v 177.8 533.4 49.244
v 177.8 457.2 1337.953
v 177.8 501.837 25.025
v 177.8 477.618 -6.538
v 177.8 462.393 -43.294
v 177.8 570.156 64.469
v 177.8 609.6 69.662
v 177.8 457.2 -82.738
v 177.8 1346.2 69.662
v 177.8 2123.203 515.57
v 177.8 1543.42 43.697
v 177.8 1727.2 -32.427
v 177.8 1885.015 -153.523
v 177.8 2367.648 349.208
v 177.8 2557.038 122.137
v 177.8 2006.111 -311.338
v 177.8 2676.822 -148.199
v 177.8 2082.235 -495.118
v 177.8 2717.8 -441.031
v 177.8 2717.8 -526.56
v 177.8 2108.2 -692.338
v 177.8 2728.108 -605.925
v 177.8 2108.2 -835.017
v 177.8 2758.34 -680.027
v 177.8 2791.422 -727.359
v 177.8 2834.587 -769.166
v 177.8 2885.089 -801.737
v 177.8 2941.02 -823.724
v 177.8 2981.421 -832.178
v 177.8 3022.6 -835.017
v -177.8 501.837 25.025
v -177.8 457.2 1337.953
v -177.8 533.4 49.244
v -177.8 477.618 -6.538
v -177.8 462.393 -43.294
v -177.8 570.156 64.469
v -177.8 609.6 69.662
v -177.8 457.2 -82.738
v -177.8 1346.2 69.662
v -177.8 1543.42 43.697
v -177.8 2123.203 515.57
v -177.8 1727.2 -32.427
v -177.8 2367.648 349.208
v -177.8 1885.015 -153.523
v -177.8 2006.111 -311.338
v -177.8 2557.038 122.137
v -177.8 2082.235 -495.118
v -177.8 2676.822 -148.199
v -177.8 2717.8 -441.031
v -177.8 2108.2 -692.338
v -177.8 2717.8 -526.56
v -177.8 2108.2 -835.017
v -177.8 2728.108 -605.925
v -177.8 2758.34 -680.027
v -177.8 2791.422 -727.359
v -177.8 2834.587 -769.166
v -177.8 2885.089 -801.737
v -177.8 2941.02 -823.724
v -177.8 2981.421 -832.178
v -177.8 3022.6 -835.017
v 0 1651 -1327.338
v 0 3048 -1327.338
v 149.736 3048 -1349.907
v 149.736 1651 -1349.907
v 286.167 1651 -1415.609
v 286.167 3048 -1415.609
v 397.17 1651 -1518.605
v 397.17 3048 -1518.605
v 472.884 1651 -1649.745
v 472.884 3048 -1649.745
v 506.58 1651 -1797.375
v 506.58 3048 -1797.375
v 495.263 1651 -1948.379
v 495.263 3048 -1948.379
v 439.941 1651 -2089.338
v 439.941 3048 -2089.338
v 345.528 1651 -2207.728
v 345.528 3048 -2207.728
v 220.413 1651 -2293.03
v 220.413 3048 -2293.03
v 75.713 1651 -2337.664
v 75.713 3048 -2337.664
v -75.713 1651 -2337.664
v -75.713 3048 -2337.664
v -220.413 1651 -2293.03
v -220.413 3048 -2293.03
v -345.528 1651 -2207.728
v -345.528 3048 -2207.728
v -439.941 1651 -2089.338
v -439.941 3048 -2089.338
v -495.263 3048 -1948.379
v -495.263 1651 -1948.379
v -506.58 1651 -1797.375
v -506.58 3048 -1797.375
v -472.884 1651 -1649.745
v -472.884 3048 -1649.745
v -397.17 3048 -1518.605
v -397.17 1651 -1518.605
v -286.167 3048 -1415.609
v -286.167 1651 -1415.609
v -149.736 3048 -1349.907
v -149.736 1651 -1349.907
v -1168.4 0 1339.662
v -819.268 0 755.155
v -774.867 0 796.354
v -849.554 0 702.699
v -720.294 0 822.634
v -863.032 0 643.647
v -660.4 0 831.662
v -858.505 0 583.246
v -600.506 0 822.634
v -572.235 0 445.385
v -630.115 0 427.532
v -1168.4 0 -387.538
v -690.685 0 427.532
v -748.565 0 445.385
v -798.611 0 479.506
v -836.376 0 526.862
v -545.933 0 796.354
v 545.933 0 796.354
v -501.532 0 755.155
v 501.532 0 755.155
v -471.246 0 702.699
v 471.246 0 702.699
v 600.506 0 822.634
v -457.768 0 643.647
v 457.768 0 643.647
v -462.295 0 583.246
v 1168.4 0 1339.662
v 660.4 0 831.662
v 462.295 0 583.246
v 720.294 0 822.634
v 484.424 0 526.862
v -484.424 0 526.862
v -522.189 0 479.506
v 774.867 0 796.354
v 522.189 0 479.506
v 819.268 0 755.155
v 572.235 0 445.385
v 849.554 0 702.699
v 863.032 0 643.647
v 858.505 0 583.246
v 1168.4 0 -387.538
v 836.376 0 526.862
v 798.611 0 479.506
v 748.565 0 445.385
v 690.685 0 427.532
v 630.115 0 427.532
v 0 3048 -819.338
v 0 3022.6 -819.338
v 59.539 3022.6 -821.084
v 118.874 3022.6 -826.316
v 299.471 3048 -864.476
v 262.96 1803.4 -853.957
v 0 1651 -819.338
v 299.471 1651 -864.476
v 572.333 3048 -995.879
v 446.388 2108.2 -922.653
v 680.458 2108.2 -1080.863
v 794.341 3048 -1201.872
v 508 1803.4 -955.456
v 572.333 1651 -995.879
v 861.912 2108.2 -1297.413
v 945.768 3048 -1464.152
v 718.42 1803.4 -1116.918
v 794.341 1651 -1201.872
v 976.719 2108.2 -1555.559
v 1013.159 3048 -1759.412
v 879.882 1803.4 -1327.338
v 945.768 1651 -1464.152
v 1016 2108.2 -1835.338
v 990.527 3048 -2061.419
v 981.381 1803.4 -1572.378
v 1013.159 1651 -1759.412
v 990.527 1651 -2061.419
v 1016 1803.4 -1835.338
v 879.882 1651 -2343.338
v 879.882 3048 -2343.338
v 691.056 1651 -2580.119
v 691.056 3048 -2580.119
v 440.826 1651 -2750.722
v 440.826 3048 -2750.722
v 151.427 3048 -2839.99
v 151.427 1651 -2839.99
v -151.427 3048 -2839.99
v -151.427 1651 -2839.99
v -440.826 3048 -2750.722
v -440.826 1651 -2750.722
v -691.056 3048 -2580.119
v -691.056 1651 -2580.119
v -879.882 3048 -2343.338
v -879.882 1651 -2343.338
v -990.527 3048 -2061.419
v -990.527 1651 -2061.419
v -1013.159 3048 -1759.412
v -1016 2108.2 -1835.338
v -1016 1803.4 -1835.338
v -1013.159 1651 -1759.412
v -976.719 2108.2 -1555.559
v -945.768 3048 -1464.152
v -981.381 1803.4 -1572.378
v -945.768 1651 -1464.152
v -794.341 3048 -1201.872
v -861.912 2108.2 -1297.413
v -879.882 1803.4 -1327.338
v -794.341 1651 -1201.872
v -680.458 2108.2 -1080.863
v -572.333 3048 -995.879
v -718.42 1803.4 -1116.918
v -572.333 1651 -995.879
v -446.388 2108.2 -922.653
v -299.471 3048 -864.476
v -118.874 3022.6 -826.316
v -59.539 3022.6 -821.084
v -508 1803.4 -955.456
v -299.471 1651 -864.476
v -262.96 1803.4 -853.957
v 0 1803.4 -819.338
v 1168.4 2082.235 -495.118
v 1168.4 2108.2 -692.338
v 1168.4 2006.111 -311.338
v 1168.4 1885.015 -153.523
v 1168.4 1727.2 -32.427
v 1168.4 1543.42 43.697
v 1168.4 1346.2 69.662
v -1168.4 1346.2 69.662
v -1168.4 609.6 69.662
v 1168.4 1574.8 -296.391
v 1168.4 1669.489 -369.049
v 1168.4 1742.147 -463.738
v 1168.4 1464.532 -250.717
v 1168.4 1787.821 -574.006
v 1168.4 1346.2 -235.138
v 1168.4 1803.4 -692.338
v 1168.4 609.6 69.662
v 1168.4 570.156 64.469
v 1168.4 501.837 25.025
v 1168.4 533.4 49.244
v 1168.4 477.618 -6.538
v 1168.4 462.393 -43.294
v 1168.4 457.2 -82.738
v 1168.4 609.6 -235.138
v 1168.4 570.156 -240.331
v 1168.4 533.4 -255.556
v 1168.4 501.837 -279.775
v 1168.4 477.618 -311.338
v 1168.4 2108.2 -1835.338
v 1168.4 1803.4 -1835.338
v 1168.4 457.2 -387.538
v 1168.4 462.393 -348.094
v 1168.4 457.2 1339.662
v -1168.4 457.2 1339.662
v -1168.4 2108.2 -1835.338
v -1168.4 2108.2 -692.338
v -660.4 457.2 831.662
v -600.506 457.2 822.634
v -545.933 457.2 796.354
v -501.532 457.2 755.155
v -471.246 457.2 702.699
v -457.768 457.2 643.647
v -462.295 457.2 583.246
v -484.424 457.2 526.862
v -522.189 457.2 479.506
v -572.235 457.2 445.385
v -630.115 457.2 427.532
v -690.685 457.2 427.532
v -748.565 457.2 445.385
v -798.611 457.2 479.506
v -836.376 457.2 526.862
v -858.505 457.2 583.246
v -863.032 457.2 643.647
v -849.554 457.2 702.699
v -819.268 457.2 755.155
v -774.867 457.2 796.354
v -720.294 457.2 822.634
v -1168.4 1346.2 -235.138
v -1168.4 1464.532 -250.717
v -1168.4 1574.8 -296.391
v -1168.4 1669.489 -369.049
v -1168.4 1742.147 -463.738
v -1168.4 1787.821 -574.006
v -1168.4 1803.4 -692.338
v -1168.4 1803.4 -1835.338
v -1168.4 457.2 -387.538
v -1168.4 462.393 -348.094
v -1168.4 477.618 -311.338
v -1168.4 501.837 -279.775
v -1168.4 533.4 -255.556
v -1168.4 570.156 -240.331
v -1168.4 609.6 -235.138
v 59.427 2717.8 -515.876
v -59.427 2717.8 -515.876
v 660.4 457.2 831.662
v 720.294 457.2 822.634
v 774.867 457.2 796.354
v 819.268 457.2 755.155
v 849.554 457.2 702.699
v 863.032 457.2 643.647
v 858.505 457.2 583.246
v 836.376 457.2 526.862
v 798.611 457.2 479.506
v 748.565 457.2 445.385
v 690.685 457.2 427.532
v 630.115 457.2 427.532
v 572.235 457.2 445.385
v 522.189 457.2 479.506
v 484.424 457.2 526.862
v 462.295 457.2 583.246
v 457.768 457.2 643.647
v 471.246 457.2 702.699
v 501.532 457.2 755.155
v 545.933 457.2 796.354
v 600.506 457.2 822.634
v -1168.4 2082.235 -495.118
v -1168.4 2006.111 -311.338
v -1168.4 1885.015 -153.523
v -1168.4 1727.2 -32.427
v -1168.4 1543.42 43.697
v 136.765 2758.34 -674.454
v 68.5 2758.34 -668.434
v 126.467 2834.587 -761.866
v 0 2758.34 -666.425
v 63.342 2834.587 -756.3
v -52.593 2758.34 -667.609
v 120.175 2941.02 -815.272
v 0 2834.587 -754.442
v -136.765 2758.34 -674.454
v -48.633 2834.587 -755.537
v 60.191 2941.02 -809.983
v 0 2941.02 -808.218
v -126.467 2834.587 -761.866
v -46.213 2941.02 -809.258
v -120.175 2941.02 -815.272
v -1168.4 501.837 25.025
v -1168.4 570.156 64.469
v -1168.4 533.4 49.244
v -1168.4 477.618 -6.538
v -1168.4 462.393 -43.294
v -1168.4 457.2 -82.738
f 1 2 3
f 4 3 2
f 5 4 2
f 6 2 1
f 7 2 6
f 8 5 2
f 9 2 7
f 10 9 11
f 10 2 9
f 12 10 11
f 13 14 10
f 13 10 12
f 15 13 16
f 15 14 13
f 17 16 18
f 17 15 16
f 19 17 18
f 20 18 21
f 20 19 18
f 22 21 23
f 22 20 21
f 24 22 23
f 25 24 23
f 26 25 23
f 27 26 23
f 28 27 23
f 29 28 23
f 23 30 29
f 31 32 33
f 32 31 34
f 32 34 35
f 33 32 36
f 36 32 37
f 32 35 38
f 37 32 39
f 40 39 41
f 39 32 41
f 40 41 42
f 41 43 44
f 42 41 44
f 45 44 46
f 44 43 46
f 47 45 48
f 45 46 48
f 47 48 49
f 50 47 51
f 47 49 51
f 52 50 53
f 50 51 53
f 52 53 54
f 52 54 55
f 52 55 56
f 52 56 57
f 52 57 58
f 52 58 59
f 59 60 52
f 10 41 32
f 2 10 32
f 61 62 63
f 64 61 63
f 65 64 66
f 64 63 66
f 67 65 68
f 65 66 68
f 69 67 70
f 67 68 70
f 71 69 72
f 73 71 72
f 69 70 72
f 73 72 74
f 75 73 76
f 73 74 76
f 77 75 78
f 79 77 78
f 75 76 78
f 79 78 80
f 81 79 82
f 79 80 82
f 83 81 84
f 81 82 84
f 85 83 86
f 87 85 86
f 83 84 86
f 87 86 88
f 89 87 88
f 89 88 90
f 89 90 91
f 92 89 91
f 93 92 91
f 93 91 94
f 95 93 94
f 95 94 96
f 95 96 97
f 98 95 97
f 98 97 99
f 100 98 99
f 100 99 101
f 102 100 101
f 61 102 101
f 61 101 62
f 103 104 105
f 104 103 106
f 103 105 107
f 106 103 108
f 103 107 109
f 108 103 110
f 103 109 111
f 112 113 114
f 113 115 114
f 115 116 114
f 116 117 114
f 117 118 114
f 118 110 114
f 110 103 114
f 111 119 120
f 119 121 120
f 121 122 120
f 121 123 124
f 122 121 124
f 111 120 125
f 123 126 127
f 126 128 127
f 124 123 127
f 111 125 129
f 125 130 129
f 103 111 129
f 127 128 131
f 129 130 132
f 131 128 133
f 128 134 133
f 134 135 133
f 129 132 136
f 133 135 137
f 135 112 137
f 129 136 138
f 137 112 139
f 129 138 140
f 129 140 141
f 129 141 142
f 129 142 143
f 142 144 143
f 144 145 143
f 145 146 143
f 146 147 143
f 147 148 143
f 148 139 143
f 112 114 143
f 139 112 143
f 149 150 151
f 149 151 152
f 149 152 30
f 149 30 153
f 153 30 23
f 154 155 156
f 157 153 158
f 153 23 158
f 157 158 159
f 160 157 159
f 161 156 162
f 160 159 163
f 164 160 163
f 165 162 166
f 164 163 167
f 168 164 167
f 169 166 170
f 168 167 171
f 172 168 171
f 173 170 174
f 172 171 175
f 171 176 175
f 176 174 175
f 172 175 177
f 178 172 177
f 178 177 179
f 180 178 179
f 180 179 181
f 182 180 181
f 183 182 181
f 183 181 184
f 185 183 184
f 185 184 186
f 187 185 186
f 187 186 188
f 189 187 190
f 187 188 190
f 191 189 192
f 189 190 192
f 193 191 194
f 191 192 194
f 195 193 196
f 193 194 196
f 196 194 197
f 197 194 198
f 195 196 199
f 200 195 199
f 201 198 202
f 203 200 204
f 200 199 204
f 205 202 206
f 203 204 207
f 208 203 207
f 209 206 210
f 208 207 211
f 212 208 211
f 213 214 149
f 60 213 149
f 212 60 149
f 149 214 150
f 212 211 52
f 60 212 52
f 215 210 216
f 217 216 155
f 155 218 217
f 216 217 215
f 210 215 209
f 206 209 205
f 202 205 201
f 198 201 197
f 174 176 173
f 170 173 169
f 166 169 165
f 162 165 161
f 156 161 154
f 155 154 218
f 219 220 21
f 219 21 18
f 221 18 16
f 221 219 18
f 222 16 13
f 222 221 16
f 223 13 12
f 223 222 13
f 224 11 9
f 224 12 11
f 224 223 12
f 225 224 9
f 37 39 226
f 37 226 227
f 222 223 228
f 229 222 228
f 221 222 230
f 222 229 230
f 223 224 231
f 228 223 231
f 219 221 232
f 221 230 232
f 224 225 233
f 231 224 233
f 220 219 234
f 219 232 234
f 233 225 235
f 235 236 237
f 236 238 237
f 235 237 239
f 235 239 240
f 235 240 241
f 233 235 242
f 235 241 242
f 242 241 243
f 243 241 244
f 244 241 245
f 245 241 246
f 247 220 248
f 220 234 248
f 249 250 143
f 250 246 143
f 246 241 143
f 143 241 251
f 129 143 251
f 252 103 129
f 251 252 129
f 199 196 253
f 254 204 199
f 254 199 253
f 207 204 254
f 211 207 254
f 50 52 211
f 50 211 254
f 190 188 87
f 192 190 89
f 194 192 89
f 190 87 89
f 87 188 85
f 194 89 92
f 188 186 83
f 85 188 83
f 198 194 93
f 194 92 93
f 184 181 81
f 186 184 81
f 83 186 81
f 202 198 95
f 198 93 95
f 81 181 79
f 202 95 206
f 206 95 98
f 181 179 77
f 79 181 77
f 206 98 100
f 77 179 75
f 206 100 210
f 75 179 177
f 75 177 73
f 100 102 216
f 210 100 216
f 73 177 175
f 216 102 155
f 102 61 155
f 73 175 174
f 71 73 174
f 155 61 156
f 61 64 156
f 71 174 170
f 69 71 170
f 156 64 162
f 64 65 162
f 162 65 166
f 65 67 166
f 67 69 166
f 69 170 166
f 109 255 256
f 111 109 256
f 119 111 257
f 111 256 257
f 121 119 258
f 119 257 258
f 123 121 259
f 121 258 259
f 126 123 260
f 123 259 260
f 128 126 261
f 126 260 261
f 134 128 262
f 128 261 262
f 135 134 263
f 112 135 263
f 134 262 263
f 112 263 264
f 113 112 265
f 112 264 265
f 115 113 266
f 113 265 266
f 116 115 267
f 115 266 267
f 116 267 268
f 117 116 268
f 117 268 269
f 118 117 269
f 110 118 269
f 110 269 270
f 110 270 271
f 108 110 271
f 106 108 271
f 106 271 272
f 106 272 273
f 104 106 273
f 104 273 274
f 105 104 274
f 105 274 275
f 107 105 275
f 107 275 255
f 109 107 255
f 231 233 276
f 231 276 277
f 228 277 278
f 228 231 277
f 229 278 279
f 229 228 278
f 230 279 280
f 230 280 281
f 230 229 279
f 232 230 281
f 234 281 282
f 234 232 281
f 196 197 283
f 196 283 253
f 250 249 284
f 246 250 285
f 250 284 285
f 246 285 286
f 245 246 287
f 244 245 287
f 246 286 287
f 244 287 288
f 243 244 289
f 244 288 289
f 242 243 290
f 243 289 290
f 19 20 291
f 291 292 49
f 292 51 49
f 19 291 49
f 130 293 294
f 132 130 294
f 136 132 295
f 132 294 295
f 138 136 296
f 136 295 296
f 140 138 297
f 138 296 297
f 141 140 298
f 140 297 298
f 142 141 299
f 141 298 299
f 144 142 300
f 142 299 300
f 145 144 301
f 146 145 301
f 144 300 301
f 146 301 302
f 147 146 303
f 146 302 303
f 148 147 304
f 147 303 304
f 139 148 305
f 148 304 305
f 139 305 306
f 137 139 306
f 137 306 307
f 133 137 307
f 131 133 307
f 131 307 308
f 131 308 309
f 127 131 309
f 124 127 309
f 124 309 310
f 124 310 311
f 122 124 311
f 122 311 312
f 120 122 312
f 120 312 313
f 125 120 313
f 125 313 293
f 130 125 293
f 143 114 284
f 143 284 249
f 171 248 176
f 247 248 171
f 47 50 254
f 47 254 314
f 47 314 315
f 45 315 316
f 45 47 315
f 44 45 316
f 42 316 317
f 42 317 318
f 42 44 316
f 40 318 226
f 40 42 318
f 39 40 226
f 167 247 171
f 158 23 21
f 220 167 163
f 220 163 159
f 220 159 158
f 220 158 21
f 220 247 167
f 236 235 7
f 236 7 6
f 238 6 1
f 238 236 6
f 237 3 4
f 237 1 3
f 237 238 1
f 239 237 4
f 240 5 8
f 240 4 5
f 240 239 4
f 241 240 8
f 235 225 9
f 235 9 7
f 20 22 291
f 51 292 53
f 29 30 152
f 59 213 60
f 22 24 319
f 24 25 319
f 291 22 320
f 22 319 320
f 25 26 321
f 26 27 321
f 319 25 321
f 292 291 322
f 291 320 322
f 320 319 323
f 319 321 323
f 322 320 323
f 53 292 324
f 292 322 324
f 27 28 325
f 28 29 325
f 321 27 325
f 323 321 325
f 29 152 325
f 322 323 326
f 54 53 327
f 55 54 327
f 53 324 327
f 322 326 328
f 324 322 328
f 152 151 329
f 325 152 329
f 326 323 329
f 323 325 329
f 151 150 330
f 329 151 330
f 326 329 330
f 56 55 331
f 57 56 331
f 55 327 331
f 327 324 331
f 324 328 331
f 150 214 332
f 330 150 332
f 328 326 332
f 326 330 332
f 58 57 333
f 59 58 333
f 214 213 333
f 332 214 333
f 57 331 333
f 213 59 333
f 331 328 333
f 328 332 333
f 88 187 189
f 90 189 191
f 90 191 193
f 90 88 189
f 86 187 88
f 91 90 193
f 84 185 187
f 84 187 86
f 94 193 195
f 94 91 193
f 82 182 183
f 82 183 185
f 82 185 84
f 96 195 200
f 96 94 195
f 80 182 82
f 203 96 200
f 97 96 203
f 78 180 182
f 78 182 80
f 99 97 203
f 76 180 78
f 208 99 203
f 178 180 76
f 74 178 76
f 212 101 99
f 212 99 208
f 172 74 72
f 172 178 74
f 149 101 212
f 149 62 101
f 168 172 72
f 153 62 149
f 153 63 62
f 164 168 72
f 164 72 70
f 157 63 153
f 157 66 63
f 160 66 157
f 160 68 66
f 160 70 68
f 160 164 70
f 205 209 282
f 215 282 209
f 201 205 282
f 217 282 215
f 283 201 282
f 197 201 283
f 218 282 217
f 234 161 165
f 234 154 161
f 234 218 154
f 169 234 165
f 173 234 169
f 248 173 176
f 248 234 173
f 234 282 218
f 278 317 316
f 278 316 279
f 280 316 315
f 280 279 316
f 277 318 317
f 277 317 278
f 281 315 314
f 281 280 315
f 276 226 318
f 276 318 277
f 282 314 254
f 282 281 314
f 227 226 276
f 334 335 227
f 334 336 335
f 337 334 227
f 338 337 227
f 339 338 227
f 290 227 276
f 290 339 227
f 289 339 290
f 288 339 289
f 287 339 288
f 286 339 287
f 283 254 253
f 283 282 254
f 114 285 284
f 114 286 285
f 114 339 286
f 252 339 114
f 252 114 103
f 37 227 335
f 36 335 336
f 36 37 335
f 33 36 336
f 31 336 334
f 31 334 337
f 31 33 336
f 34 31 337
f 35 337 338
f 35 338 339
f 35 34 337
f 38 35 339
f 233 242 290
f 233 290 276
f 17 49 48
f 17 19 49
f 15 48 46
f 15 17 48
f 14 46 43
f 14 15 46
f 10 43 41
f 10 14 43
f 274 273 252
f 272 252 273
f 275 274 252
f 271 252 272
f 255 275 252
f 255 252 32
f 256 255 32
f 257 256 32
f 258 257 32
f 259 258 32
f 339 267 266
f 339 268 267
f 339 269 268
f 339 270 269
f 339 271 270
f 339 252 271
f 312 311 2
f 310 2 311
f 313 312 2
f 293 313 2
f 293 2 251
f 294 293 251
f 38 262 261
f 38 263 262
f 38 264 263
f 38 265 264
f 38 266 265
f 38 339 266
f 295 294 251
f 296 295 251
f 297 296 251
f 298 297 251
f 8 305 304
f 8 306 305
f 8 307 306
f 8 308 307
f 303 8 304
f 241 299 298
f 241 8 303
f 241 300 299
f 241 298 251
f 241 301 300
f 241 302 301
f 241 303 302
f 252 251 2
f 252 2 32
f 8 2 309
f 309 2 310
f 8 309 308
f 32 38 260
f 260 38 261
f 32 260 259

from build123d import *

# Parameters (mm, degrees)
SKETCH1_W                = 2336.8
SKETCH1_H                = 1727.2
BOSS_EXTRUDE1_DEPTH      = 457.2
SKETCH2_R                = 203.2
CUT_EXTRUDE1_DEPTH       = 1836.452141677
BOSS_EXTRUDE2_DEPTH      = 2336.8
FILLET2_R                = 152.4
BOSS_EXTRUDE3_DEPTH      = 939.8
BOSS_EXTRUDE3_DEPTH_BACK = 457.2
SKETCH5_R                = 1016
SKETCH6_R                = 508
CUT_EXTRUDE2_DEPTH       = 4335.234786449
RIB1_START               = -177.8
RIB1_DEPTH               = 355.6
FILLET3_R                = 1066.8
FILLET4_R                = 304.8


# Read off the part's stored shape, not the designer's step: Rib1
with BuildPart() as part:
    # Sketch1 → Boss-Extrude1 (new body)
    with BuildSketch(Plane(origin=(0, 0, 0), x_dir=(1, 0, 0), z_dir=(0, 1, 0))):
        with Locations((0, -476.061958998)):
            Rectangle(SKETCH1_W, SKETCH1_H)
    extrude(amount=BOSS_EXTRUDE1_DEPTH)

    # Sketch2 → Cut-Extrude1 (cut, through all)
    with BuildSketch(Plane(origin=(0, 457.2, 0), x_dir=(1, 0, 0), z_dir=(0, 1, 0))):
        with Locations(Location((-660.4, -628.461958998, 0), (0, 0, 270))):
            Circle(SKETCH2_R)
        with Locations(Location((660.4, -628.461958998, 0), (0, 0, 270))):
            Circle(SKETCH2_R)
    extrude(amount=-CUT_EXTRUDE1_DEPTH, mode=Mode.SUBTRACT)

    # Sketch4 → Boss-Extrude2 (add, through all)
    with BuildSketch(Plane(origin=(1168.4, 0, 0), x_dir=(0, 0, -1), z_dir=(1, 0, 0))):
        with BuildLine():
            Line((235.138041002, 457.2), (235.138041002, 1346.2))
            ThreePointArc((235.138041002, 1346.2), (369.048820644, 1669.489220358), (692.338041002, 1803.4))
            Line((692.338041002, 1803.4), (1835.338041002, 1803.4))
            Line((1835.338041002, 1803.4), (1835.338041002, 2108.2))
            Line((1835.338041002, 2108.2), (692.338041002, 2108.2))
            ThreePointArc((692.338041002, 2108.2), (153.522673738, 1885.015367264), (-69.661958998, 1346.2))
            Line((-69.661958998, 1346.2), (-69.661958998, 609.6))
            ThreePointArc((-69.661958998, 609.6), (-25.025032451, 501.836926547), (82.738041002, 457.2))
            Line((82.738041002, 457.2), (235.138041002, 457.2))
        make_face()
    extrude(amount=-BOSS_EXTRUDE2_DEPTH)

    # Fillet2
    fillet2_edges = [part.edges().sort_by_distance(p)[0] for p in [
        (0, 457.2, -235.138041002),
    ]]
    fillet(fillet2_edges, radius=FILLET2_R - 0.0001)  # a hair under: the kernel refuses the full size

    # Sketch5 → Boss-Extrude3 (add, two sides: drawn at the far end of the back side and taken through both)
    with BuildSketch(Plane(origin=(0, 2108.2, 0), x_dir=(1, 0, 0), z_dir=(0, 1, 0)).offset(-BOSS_EXTRUDE3_DEPTH_BACK)):
        with Locations(Location((0, 1835.338041002, 0), (0, 0, 270))):
            Circle(SKETCH5_R)
    extrude(amount=BOSS_EXTRUDE3_DEPTH + BOSS_EXTRUDE3_DEPTH_BACK)

    # Sketch6 → Cut-Extrude2 (cut, through all)
    with BuildSketch(Plane(origin=(0, 3048, 0), x_dir=(1, 0, 0), z_dir=(0, 1, 0))):
        with Locations(Location((0, 1835.338041002, 0), (0, 0, 270))):
            Circle(SKETCH6_R)
    extrude(amount=-CUT_EXTRUDE2_DEPTH, mode=Mode.SUBTRACT)

    # Rib1 outline → Rib1 (add)
    with BuildSketch(Plane(origin=(0, 0, 0), x_dir=(0, 0, -1), z_dir=(1, 0, 0)).offset(RIB1_START)):
        with BuildLine():
            Line((837, 2717.8), (-222.061958998, 2717.8))
            Line((-222.061958998, 2717.8), (-1337.953329415, 457.2))
            Line((-1337.953329415, 457.2), (82.738041002, 457.2))
            ThreePointArc((82.738041002, 457.2), (-25.025032451, 501.836926547), (-69.661958998, 609.6))
            Line((-69.661958998, 609.6), (-69.661958998, 1346.2))
            ThreePointArc((-69.661958998, 1346.2), (153.522673738, 1885.015367264), (692.338041002, 2108.2))
            Line((692.338041002, 2108.2), (837, 2108.2))
            Line((837, 2108.2), (837, 2717.8))
        make_face()
    extrude(amount=RIB1_DEPTH)

    # Fillet3
    fillet3_edges = [part.edges().sort_by_distance(p)[0] for p in [
        (0, 2717.8, 222.061958998),
    ]]
    fillet(fillet3_edges, radius=FILLET3_R)

    # Fillet4
    fillet4_edges = [part.edges().sort_by_distance(p)[0] for p in [
        (89.244964108, 2717.8, -823.265248965),
    ]]
    fillet(fillet4_edges, radius=FILLET4_R)


solid = part.part
